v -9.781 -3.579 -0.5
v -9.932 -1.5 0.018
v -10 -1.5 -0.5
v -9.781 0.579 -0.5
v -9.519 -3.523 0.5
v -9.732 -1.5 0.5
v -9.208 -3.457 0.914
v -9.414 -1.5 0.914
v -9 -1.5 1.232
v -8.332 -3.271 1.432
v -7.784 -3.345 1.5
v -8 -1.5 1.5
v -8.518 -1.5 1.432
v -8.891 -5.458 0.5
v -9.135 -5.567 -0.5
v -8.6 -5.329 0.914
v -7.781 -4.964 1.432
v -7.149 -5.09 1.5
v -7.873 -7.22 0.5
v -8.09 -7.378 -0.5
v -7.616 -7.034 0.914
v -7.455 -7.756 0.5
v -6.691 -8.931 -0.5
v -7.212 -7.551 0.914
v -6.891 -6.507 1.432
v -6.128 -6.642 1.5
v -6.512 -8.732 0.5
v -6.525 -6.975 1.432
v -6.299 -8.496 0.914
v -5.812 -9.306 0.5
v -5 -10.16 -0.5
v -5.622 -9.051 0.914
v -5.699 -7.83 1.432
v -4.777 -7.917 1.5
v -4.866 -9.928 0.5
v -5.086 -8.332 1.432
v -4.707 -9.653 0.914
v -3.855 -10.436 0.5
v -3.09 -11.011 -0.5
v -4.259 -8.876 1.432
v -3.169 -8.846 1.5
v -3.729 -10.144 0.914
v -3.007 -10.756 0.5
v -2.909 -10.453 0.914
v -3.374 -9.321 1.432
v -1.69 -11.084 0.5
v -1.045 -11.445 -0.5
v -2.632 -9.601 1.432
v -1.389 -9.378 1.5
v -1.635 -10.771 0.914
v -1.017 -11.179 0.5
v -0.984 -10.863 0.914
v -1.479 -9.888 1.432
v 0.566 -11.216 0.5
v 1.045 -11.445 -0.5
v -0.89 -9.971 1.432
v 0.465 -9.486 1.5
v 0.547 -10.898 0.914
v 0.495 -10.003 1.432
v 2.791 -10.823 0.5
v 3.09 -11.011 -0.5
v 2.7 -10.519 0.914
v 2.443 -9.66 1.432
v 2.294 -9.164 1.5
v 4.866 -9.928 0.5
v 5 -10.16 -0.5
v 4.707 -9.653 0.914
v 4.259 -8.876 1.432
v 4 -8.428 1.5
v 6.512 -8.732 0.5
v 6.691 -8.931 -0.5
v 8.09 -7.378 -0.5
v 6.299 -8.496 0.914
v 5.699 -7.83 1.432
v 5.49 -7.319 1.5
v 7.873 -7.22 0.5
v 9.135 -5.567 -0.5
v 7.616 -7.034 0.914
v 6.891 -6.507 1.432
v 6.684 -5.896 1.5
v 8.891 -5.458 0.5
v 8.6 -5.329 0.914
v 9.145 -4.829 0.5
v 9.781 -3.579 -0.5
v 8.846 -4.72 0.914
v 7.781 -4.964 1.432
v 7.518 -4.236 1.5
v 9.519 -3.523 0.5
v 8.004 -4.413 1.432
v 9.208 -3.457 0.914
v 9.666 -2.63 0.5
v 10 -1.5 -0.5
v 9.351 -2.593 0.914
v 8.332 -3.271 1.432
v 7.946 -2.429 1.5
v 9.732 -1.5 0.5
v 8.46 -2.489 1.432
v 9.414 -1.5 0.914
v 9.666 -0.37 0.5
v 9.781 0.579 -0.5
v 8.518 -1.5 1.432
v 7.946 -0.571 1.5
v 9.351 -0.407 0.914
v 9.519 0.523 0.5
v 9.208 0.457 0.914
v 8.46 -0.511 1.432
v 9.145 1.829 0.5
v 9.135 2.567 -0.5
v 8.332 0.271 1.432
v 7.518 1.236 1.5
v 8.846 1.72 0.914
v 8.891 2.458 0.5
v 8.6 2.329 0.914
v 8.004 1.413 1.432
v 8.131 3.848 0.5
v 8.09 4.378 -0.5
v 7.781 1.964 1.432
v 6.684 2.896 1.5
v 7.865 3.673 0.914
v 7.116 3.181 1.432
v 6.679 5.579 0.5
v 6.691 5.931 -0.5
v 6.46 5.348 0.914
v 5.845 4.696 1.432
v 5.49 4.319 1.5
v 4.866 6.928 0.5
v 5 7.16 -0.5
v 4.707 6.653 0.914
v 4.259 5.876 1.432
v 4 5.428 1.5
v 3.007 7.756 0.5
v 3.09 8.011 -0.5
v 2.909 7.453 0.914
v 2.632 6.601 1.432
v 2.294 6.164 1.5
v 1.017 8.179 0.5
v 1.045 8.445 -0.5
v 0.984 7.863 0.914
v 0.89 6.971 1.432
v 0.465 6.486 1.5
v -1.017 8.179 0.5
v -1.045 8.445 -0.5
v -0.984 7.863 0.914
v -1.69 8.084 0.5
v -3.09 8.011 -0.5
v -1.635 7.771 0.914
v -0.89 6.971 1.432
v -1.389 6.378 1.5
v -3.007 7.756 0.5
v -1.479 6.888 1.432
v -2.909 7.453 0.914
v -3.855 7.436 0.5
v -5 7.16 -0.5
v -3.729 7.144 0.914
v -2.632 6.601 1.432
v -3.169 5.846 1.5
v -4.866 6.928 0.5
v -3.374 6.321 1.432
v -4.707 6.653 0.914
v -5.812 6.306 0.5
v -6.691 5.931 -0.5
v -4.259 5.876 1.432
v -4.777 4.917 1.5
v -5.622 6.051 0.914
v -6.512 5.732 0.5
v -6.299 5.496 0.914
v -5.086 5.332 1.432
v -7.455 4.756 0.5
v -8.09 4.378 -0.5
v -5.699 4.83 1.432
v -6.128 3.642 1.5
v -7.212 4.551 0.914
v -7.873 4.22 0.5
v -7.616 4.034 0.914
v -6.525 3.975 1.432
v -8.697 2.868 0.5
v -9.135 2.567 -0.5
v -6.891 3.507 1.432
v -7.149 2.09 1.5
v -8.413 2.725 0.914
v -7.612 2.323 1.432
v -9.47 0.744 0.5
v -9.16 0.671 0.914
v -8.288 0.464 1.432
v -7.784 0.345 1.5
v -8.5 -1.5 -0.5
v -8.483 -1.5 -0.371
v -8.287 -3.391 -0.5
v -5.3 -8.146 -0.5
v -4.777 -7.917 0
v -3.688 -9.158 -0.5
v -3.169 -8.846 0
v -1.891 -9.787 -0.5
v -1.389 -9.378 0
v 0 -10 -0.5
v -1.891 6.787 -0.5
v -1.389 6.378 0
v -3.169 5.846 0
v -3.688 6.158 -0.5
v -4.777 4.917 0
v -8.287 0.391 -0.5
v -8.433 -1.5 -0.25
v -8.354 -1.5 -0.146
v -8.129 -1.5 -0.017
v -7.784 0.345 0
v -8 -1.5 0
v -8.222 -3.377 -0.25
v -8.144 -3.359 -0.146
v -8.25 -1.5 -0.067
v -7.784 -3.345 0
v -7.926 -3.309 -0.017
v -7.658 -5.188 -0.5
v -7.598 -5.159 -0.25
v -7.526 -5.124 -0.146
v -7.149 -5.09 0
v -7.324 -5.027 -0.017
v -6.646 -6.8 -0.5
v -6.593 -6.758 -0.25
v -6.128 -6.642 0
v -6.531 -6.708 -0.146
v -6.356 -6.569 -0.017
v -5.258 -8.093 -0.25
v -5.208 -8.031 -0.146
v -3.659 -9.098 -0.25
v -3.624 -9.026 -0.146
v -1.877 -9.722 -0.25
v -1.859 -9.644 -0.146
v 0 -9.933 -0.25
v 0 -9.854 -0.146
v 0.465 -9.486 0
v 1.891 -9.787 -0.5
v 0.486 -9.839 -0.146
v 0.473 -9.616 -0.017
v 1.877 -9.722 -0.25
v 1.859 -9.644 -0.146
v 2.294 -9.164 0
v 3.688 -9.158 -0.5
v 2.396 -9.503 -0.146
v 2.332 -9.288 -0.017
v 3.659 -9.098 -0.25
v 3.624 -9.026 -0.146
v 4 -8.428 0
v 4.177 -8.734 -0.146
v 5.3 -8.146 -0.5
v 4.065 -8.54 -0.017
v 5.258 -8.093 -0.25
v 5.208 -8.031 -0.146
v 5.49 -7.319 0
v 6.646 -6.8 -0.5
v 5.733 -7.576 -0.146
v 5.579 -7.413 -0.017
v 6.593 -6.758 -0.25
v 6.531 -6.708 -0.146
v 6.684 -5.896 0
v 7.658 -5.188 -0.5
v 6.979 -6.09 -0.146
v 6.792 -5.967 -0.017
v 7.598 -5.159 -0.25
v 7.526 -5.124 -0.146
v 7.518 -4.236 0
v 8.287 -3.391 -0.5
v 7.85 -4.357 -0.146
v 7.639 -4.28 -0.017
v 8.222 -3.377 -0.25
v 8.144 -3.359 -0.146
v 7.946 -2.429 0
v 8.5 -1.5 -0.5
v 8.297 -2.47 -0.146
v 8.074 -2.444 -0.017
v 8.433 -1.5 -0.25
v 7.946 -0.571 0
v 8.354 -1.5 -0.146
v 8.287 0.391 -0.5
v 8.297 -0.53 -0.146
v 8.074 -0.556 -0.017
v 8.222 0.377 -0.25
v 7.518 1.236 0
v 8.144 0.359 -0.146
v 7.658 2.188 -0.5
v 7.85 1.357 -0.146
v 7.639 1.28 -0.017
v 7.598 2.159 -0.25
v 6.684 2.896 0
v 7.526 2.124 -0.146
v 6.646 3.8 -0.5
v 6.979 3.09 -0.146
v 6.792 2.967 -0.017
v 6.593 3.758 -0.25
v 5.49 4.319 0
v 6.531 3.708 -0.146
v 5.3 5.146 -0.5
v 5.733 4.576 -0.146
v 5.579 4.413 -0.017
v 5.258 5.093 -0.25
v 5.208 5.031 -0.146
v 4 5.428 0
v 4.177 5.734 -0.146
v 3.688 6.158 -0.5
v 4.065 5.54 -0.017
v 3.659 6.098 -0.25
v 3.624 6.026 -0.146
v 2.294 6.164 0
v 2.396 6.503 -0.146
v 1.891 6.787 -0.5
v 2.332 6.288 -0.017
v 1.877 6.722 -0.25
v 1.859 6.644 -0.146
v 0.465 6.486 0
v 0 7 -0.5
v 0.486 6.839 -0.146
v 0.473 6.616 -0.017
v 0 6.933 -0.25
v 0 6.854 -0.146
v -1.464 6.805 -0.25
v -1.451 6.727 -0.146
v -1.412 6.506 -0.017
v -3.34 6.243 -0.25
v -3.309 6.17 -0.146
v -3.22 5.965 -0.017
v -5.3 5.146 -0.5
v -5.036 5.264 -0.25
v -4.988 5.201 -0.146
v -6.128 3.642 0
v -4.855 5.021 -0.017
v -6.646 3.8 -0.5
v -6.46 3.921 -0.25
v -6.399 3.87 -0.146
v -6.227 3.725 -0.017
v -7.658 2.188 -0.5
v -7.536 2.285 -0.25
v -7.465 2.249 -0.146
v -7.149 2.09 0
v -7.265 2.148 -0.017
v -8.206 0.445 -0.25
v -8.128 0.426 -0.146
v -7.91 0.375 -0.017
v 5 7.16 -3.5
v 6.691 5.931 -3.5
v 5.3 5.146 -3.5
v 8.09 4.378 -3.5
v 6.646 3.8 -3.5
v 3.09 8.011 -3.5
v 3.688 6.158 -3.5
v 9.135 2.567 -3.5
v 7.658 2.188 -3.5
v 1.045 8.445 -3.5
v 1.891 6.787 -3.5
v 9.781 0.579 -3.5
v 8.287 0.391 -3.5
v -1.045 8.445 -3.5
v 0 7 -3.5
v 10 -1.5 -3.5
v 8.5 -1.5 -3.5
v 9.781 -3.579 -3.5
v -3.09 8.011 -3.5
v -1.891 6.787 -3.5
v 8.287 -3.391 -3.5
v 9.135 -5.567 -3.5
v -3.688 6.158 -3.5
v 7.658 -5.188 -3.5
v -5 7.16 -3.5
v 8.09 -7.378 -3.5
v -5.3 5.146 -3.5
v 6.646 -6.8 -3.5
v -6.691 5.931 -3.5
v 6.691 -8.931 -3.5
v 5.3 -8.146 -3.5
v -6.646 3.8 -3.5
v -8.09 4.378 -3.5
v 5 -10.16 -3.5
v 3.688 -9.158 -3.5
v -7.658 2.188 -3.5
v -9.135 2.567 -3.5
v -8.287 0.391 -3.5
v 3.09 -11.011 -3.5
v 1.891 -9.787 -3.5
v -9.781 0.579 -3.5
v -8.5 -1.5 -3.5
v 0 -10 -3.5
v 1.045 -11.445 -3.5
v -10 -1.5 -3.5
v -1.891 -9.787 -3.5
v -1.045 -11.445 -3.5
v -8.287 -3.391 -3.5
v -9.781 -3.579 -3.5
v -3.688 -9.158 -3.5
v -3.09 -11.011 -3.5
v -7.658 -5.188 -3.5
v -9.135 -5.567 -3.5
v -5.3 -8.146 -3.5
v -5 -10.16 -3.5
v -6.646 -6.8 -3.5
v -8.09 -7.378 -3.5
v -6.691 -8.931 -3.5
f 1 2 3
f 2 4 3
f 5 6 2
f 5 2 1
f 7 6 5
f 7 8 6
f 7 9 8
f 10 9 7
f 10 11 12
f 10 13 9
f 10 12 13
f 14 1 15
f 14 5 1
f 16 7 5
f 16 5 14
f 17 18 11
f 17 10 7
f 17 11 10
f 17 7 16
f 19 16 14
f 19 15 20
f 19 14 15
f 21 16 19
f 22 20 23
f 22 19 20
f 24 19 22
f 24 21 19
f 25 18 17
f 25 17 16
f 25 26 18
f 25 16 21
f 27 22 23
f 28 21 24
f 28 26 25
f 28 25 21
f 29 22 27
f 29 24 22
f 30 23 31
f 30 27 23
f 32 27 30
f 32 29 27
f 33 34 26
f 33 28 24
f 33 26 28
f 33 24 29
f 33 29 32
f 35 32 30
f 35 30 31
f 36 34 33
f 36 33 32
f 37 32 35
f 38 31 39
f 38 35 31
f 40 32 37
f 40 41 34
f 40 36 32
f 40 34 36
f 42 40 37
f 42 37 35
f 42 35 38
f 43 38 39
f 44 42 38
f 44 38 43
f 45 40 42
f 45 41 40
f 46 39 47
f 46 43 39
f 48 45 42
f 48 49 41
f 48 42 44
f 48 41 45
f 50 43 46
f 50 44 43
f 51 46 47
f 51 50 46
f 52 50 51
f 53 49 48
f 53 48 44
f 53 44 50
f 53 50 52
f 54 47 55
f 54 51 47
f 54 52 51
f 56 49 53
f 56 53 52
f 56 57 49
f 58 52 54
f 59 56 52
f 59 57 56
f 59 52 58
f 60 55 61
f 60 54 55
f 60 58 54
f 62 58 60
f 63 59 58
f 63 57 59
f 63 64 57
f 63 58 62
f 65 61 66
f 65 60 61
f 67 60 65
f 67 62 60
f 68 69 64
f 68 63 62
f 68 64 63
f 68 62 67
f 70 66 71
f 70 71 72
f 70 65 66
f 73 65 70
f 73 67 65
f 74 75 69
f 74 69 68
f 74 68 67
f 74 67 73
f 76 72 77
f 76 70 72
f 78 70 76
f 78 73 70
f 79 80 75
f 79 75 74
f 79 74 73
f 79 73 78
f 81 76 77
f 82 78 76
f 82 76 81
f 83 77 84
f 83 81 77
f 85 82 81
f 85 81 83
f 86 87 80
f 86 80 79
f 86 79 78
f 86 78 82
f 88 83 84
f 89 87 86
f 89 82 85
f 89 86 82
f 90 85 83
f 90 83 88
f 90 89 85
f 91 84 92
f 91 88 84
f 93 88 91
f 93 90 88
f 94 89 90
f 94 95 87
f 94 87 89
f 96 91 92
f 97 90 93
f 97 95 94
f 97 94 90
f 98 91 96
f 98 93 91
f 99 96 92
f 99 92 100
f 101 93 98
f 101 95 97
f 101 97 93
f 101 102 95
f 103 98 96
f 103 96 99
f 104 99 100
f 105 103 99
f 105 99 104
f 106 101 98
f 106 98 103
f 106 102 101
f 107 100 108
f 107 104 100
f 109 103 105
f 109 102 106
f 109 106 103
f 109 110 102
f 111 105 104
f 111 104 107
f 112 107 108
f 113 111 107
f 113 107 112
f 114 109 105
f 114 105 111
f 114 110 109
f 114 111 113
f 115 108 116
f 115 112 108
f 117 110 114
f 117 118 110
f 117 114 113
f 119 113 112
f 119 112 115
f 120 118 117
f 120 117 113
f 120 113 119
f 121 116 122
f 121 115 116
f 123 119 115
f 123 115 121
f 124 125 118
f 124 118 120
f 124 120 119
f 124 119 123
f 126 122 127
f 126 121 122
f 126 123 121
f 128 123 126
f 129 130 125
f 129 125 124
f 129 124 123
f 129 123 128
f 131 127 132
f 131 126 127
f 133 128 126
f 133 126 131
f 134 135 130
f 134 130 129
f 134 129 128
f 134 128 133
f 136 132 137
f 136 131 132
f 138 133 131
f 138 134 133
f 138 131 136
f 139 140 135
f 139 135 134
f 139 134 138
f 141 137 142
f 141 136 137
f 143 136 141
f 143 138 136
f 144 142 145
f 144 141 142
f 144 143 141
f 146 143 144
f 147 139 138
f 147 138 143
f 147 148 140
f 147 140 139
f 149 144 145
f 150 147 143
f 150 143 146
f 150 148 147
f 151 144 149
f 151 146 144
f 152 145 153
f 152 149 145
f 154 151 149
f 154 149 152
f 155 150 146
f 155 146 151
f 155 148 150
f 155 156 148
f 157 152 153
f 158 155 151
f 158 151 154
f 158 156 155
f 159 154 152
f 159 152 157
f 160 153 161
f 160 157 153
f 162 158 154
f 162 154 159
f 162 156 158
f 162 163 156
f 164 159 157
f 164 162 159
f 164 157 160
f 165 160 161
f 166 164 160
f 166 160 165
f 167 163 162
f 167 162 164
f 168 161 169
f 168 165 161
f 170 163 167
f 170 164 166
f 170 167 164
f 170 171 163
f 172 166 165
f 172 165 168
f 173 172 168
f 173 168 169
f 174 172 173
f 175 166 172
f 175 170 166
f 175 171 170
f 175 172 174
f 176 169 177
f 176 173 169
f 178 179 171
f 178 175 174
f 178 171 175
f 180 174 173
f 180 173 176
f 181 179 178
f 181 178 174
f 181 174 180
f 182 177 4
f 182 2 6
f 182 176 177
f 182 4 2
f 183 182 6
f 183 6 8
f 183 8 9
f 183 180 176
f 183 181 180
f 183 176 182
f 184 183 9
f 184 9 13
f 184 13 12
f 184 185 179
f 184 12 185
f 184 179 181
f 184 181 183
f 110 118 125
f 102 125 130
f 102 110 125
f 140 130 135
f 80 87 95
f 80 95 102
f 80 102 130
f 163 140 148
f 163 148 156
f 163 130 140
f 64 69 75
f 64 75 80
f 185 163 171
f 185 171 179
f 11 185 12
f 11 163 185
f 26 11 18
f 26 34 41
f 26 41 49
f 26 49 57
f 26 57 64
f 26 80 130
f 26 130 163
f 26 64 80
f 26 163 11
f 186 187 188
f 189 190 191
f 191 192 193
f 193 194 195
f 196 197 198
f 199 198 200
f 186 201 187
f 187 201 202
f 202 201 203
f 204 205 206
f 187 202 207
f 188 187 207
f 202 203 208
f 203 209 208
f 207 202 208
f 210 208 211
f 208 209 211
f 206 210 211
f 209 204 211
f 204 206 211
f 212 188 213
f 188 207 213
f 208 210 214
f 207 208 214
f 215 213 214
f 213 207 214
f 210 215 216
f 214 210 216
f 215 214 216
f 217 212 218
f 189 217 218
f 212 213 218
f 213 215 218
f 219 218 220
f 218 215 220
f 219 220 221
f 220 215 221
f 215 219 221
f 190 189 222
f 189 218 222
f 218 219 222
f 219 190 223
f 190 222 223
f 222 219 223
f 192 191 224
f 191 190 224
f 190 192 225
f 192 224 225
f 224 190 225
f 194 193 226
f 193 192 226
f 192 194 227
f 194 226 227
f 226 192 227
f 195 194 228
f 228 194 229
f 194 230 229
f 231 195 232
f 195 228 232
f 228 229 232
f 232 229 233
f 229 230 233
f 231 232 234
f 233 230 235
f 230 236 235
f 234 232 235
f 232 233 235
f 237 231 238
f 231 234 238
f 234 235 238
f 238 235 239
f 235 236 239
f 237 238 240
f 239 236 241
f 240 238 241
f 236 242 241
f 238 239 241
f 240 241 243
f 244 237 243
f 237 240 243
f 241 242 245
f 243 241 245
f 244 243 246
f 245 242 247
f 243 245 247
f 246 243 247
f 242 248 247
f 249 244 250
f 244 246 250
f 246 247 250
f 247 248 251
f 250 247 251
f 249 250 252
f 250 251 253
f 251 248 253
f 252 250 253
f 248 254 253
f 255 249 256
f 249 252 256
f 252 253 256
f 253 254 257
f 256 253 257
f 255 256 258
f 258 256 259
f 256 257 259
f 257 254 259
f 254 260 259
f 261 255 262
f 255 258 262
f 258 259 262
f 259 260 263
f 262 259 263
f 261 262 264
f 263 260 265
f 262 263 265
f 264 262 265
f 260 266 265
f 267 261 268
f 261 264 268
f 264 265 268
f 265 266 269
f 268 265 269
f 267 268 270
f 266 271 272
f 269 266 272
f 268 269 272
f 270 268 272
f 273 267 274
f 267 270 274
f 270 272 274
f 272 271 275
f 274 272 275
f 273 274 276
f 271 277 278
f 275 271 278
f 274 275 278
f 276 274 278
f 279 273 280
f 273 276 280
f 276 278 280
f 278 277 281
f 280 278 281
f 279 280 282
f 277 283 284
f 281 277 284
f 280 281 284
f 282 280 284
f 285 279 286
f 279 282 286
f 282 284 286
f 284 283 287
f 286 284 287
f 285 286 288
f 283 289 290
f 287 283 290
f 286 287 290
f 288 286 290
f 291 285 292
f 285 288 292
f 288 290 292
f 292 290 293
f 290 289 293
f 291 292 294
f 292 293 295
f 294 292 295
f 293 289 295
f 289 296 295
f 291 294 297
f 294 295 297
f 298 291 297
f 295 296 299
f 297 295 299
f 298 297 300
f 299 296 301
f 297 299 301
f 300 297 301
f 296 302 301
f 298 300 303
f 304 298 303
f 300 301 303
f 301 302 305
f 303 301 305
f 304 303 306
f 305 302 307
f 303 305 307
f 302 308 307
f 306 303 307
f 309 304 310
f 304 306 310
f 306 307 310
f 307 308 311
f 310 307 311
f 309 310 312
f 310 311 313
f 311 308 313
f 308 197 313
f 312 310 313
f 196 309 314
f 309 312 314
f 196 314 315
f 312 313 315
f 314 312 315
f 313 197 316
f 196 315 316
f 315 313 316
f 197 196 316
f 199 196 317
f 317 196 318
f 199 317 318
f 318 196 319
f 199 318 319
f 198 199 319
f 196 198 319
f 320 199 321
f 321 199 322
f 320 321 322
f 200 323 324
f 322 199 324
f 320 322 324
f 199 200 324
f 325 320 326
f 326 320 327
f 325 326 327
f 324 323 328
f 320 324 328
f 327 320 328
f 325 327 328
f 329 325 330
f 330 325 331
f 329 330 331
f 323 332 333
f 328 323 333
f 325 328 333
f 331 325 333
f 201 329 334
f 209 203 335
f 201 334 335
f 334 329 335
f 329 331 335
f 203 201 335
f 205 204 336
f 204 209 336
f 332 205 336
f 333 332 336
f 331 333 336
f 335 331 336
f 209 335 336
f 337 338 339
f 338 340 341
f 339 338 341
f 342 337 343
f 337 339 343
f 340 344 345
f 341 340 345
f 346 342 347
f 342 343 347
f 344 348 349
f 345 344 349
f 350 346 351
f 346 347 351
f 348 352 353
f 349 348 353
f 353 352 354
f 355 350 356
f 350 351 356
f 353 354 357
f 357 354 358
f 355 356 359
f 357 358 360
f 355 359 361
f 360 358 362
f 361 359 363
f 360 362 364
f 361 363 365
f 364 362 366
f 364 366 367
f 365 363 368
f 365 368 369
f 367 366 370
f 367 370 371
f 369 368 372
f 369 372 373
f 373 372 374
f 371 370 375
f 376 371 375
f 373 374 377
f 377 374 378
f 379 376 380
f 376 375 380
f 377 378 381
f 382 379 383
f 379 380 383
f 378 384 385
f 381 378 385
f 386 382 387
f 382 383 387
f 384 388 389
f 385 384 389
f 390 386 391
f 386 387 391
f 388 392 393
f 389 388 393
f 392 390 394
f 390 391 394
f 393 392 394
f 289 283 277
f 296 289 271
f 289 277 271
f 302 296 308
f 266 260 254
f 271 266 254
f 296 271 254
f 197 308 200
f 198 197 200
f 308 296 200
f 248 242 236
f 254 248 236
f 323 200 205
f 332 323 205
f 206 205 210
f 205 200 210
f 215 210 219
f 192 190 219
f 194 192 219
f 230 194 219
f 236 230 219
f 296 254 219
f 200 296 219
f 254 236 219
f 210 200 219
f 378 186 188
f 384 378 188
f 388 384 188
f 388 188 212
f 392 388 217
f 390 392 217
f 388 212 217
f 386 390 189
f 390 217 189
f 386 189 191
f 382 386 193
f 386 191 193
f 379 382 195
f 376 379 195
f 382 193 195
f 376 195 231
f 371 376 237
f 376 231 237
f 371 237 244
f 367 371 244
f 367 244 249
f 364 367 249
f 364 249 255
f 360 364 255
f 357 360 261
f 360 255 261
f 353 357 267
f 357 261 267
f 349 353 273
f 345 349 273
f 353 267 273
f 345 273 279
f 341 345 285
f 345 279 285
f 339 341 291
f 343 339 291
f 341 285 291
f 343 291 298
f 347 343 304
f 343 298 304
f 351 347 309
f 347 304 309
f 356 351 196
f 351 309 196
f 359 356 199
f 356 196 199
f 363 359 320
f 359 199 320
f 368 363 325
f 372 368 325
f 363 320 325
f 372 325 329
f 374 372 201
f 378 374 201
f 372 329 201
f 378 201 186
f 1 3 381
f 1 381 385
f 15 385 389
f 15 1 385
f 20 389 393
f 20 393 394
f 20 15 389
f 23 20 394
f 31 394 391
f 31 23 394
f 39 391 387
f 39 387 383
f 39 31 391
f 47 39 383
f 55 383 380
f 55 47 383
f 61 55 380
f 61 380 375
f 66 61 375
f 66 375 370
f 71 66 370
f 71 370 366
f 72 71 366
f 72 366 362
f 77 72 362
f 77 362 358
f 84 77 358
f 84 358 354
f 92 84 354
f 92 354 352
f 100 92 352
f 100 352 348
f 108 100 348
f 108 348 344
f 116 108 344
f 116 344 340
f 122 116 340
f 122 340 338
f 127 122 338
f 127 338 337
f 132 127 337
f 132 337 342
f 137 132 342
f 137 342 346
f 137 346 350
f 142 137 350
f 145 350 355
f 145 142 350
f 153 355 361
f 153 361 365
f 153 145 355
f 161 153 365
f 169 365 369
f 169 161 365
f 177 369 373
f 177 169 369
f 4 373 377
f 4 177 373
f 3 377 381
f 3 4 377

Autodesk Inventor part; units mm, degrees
ref_plane "YZ Plane" through (0, 0, 0) normal (1, 0, 0) x (0, 1, 0)
ref_plane "XZ Plane" through (0, 0, 0) normal (0, 1, 0) x (-1, 0, 0)
ref_plane "XY Plane" through (0, 0, 0) normal (0, 0, 1) x (1, 0, 0)
sketch "草图1" plane through (0, 0, 0) normal (0, 1, 0) x (-1, 0, 0)
  circle A0 centre (0, 0) radius 10
  dimension "d0" = 20
extrude "拉伸1" add sketch "草图1" against normal blind 5
fillet "圆角1" radius 2 1 edges at (10, 0, 0)
shell "抽壳1" thickness 1.5 removed faces 1 at (1.182, -5, 3.1167)
move or copy body "旋转1" bodies to move or copy 1 copy no rotation origin (0, 0, 0) rotation axis (1, 0, 0) rotation angle 90 translate (0, -1.5, 1.5)
properties part number "Buttonx20" material "玻璃"
